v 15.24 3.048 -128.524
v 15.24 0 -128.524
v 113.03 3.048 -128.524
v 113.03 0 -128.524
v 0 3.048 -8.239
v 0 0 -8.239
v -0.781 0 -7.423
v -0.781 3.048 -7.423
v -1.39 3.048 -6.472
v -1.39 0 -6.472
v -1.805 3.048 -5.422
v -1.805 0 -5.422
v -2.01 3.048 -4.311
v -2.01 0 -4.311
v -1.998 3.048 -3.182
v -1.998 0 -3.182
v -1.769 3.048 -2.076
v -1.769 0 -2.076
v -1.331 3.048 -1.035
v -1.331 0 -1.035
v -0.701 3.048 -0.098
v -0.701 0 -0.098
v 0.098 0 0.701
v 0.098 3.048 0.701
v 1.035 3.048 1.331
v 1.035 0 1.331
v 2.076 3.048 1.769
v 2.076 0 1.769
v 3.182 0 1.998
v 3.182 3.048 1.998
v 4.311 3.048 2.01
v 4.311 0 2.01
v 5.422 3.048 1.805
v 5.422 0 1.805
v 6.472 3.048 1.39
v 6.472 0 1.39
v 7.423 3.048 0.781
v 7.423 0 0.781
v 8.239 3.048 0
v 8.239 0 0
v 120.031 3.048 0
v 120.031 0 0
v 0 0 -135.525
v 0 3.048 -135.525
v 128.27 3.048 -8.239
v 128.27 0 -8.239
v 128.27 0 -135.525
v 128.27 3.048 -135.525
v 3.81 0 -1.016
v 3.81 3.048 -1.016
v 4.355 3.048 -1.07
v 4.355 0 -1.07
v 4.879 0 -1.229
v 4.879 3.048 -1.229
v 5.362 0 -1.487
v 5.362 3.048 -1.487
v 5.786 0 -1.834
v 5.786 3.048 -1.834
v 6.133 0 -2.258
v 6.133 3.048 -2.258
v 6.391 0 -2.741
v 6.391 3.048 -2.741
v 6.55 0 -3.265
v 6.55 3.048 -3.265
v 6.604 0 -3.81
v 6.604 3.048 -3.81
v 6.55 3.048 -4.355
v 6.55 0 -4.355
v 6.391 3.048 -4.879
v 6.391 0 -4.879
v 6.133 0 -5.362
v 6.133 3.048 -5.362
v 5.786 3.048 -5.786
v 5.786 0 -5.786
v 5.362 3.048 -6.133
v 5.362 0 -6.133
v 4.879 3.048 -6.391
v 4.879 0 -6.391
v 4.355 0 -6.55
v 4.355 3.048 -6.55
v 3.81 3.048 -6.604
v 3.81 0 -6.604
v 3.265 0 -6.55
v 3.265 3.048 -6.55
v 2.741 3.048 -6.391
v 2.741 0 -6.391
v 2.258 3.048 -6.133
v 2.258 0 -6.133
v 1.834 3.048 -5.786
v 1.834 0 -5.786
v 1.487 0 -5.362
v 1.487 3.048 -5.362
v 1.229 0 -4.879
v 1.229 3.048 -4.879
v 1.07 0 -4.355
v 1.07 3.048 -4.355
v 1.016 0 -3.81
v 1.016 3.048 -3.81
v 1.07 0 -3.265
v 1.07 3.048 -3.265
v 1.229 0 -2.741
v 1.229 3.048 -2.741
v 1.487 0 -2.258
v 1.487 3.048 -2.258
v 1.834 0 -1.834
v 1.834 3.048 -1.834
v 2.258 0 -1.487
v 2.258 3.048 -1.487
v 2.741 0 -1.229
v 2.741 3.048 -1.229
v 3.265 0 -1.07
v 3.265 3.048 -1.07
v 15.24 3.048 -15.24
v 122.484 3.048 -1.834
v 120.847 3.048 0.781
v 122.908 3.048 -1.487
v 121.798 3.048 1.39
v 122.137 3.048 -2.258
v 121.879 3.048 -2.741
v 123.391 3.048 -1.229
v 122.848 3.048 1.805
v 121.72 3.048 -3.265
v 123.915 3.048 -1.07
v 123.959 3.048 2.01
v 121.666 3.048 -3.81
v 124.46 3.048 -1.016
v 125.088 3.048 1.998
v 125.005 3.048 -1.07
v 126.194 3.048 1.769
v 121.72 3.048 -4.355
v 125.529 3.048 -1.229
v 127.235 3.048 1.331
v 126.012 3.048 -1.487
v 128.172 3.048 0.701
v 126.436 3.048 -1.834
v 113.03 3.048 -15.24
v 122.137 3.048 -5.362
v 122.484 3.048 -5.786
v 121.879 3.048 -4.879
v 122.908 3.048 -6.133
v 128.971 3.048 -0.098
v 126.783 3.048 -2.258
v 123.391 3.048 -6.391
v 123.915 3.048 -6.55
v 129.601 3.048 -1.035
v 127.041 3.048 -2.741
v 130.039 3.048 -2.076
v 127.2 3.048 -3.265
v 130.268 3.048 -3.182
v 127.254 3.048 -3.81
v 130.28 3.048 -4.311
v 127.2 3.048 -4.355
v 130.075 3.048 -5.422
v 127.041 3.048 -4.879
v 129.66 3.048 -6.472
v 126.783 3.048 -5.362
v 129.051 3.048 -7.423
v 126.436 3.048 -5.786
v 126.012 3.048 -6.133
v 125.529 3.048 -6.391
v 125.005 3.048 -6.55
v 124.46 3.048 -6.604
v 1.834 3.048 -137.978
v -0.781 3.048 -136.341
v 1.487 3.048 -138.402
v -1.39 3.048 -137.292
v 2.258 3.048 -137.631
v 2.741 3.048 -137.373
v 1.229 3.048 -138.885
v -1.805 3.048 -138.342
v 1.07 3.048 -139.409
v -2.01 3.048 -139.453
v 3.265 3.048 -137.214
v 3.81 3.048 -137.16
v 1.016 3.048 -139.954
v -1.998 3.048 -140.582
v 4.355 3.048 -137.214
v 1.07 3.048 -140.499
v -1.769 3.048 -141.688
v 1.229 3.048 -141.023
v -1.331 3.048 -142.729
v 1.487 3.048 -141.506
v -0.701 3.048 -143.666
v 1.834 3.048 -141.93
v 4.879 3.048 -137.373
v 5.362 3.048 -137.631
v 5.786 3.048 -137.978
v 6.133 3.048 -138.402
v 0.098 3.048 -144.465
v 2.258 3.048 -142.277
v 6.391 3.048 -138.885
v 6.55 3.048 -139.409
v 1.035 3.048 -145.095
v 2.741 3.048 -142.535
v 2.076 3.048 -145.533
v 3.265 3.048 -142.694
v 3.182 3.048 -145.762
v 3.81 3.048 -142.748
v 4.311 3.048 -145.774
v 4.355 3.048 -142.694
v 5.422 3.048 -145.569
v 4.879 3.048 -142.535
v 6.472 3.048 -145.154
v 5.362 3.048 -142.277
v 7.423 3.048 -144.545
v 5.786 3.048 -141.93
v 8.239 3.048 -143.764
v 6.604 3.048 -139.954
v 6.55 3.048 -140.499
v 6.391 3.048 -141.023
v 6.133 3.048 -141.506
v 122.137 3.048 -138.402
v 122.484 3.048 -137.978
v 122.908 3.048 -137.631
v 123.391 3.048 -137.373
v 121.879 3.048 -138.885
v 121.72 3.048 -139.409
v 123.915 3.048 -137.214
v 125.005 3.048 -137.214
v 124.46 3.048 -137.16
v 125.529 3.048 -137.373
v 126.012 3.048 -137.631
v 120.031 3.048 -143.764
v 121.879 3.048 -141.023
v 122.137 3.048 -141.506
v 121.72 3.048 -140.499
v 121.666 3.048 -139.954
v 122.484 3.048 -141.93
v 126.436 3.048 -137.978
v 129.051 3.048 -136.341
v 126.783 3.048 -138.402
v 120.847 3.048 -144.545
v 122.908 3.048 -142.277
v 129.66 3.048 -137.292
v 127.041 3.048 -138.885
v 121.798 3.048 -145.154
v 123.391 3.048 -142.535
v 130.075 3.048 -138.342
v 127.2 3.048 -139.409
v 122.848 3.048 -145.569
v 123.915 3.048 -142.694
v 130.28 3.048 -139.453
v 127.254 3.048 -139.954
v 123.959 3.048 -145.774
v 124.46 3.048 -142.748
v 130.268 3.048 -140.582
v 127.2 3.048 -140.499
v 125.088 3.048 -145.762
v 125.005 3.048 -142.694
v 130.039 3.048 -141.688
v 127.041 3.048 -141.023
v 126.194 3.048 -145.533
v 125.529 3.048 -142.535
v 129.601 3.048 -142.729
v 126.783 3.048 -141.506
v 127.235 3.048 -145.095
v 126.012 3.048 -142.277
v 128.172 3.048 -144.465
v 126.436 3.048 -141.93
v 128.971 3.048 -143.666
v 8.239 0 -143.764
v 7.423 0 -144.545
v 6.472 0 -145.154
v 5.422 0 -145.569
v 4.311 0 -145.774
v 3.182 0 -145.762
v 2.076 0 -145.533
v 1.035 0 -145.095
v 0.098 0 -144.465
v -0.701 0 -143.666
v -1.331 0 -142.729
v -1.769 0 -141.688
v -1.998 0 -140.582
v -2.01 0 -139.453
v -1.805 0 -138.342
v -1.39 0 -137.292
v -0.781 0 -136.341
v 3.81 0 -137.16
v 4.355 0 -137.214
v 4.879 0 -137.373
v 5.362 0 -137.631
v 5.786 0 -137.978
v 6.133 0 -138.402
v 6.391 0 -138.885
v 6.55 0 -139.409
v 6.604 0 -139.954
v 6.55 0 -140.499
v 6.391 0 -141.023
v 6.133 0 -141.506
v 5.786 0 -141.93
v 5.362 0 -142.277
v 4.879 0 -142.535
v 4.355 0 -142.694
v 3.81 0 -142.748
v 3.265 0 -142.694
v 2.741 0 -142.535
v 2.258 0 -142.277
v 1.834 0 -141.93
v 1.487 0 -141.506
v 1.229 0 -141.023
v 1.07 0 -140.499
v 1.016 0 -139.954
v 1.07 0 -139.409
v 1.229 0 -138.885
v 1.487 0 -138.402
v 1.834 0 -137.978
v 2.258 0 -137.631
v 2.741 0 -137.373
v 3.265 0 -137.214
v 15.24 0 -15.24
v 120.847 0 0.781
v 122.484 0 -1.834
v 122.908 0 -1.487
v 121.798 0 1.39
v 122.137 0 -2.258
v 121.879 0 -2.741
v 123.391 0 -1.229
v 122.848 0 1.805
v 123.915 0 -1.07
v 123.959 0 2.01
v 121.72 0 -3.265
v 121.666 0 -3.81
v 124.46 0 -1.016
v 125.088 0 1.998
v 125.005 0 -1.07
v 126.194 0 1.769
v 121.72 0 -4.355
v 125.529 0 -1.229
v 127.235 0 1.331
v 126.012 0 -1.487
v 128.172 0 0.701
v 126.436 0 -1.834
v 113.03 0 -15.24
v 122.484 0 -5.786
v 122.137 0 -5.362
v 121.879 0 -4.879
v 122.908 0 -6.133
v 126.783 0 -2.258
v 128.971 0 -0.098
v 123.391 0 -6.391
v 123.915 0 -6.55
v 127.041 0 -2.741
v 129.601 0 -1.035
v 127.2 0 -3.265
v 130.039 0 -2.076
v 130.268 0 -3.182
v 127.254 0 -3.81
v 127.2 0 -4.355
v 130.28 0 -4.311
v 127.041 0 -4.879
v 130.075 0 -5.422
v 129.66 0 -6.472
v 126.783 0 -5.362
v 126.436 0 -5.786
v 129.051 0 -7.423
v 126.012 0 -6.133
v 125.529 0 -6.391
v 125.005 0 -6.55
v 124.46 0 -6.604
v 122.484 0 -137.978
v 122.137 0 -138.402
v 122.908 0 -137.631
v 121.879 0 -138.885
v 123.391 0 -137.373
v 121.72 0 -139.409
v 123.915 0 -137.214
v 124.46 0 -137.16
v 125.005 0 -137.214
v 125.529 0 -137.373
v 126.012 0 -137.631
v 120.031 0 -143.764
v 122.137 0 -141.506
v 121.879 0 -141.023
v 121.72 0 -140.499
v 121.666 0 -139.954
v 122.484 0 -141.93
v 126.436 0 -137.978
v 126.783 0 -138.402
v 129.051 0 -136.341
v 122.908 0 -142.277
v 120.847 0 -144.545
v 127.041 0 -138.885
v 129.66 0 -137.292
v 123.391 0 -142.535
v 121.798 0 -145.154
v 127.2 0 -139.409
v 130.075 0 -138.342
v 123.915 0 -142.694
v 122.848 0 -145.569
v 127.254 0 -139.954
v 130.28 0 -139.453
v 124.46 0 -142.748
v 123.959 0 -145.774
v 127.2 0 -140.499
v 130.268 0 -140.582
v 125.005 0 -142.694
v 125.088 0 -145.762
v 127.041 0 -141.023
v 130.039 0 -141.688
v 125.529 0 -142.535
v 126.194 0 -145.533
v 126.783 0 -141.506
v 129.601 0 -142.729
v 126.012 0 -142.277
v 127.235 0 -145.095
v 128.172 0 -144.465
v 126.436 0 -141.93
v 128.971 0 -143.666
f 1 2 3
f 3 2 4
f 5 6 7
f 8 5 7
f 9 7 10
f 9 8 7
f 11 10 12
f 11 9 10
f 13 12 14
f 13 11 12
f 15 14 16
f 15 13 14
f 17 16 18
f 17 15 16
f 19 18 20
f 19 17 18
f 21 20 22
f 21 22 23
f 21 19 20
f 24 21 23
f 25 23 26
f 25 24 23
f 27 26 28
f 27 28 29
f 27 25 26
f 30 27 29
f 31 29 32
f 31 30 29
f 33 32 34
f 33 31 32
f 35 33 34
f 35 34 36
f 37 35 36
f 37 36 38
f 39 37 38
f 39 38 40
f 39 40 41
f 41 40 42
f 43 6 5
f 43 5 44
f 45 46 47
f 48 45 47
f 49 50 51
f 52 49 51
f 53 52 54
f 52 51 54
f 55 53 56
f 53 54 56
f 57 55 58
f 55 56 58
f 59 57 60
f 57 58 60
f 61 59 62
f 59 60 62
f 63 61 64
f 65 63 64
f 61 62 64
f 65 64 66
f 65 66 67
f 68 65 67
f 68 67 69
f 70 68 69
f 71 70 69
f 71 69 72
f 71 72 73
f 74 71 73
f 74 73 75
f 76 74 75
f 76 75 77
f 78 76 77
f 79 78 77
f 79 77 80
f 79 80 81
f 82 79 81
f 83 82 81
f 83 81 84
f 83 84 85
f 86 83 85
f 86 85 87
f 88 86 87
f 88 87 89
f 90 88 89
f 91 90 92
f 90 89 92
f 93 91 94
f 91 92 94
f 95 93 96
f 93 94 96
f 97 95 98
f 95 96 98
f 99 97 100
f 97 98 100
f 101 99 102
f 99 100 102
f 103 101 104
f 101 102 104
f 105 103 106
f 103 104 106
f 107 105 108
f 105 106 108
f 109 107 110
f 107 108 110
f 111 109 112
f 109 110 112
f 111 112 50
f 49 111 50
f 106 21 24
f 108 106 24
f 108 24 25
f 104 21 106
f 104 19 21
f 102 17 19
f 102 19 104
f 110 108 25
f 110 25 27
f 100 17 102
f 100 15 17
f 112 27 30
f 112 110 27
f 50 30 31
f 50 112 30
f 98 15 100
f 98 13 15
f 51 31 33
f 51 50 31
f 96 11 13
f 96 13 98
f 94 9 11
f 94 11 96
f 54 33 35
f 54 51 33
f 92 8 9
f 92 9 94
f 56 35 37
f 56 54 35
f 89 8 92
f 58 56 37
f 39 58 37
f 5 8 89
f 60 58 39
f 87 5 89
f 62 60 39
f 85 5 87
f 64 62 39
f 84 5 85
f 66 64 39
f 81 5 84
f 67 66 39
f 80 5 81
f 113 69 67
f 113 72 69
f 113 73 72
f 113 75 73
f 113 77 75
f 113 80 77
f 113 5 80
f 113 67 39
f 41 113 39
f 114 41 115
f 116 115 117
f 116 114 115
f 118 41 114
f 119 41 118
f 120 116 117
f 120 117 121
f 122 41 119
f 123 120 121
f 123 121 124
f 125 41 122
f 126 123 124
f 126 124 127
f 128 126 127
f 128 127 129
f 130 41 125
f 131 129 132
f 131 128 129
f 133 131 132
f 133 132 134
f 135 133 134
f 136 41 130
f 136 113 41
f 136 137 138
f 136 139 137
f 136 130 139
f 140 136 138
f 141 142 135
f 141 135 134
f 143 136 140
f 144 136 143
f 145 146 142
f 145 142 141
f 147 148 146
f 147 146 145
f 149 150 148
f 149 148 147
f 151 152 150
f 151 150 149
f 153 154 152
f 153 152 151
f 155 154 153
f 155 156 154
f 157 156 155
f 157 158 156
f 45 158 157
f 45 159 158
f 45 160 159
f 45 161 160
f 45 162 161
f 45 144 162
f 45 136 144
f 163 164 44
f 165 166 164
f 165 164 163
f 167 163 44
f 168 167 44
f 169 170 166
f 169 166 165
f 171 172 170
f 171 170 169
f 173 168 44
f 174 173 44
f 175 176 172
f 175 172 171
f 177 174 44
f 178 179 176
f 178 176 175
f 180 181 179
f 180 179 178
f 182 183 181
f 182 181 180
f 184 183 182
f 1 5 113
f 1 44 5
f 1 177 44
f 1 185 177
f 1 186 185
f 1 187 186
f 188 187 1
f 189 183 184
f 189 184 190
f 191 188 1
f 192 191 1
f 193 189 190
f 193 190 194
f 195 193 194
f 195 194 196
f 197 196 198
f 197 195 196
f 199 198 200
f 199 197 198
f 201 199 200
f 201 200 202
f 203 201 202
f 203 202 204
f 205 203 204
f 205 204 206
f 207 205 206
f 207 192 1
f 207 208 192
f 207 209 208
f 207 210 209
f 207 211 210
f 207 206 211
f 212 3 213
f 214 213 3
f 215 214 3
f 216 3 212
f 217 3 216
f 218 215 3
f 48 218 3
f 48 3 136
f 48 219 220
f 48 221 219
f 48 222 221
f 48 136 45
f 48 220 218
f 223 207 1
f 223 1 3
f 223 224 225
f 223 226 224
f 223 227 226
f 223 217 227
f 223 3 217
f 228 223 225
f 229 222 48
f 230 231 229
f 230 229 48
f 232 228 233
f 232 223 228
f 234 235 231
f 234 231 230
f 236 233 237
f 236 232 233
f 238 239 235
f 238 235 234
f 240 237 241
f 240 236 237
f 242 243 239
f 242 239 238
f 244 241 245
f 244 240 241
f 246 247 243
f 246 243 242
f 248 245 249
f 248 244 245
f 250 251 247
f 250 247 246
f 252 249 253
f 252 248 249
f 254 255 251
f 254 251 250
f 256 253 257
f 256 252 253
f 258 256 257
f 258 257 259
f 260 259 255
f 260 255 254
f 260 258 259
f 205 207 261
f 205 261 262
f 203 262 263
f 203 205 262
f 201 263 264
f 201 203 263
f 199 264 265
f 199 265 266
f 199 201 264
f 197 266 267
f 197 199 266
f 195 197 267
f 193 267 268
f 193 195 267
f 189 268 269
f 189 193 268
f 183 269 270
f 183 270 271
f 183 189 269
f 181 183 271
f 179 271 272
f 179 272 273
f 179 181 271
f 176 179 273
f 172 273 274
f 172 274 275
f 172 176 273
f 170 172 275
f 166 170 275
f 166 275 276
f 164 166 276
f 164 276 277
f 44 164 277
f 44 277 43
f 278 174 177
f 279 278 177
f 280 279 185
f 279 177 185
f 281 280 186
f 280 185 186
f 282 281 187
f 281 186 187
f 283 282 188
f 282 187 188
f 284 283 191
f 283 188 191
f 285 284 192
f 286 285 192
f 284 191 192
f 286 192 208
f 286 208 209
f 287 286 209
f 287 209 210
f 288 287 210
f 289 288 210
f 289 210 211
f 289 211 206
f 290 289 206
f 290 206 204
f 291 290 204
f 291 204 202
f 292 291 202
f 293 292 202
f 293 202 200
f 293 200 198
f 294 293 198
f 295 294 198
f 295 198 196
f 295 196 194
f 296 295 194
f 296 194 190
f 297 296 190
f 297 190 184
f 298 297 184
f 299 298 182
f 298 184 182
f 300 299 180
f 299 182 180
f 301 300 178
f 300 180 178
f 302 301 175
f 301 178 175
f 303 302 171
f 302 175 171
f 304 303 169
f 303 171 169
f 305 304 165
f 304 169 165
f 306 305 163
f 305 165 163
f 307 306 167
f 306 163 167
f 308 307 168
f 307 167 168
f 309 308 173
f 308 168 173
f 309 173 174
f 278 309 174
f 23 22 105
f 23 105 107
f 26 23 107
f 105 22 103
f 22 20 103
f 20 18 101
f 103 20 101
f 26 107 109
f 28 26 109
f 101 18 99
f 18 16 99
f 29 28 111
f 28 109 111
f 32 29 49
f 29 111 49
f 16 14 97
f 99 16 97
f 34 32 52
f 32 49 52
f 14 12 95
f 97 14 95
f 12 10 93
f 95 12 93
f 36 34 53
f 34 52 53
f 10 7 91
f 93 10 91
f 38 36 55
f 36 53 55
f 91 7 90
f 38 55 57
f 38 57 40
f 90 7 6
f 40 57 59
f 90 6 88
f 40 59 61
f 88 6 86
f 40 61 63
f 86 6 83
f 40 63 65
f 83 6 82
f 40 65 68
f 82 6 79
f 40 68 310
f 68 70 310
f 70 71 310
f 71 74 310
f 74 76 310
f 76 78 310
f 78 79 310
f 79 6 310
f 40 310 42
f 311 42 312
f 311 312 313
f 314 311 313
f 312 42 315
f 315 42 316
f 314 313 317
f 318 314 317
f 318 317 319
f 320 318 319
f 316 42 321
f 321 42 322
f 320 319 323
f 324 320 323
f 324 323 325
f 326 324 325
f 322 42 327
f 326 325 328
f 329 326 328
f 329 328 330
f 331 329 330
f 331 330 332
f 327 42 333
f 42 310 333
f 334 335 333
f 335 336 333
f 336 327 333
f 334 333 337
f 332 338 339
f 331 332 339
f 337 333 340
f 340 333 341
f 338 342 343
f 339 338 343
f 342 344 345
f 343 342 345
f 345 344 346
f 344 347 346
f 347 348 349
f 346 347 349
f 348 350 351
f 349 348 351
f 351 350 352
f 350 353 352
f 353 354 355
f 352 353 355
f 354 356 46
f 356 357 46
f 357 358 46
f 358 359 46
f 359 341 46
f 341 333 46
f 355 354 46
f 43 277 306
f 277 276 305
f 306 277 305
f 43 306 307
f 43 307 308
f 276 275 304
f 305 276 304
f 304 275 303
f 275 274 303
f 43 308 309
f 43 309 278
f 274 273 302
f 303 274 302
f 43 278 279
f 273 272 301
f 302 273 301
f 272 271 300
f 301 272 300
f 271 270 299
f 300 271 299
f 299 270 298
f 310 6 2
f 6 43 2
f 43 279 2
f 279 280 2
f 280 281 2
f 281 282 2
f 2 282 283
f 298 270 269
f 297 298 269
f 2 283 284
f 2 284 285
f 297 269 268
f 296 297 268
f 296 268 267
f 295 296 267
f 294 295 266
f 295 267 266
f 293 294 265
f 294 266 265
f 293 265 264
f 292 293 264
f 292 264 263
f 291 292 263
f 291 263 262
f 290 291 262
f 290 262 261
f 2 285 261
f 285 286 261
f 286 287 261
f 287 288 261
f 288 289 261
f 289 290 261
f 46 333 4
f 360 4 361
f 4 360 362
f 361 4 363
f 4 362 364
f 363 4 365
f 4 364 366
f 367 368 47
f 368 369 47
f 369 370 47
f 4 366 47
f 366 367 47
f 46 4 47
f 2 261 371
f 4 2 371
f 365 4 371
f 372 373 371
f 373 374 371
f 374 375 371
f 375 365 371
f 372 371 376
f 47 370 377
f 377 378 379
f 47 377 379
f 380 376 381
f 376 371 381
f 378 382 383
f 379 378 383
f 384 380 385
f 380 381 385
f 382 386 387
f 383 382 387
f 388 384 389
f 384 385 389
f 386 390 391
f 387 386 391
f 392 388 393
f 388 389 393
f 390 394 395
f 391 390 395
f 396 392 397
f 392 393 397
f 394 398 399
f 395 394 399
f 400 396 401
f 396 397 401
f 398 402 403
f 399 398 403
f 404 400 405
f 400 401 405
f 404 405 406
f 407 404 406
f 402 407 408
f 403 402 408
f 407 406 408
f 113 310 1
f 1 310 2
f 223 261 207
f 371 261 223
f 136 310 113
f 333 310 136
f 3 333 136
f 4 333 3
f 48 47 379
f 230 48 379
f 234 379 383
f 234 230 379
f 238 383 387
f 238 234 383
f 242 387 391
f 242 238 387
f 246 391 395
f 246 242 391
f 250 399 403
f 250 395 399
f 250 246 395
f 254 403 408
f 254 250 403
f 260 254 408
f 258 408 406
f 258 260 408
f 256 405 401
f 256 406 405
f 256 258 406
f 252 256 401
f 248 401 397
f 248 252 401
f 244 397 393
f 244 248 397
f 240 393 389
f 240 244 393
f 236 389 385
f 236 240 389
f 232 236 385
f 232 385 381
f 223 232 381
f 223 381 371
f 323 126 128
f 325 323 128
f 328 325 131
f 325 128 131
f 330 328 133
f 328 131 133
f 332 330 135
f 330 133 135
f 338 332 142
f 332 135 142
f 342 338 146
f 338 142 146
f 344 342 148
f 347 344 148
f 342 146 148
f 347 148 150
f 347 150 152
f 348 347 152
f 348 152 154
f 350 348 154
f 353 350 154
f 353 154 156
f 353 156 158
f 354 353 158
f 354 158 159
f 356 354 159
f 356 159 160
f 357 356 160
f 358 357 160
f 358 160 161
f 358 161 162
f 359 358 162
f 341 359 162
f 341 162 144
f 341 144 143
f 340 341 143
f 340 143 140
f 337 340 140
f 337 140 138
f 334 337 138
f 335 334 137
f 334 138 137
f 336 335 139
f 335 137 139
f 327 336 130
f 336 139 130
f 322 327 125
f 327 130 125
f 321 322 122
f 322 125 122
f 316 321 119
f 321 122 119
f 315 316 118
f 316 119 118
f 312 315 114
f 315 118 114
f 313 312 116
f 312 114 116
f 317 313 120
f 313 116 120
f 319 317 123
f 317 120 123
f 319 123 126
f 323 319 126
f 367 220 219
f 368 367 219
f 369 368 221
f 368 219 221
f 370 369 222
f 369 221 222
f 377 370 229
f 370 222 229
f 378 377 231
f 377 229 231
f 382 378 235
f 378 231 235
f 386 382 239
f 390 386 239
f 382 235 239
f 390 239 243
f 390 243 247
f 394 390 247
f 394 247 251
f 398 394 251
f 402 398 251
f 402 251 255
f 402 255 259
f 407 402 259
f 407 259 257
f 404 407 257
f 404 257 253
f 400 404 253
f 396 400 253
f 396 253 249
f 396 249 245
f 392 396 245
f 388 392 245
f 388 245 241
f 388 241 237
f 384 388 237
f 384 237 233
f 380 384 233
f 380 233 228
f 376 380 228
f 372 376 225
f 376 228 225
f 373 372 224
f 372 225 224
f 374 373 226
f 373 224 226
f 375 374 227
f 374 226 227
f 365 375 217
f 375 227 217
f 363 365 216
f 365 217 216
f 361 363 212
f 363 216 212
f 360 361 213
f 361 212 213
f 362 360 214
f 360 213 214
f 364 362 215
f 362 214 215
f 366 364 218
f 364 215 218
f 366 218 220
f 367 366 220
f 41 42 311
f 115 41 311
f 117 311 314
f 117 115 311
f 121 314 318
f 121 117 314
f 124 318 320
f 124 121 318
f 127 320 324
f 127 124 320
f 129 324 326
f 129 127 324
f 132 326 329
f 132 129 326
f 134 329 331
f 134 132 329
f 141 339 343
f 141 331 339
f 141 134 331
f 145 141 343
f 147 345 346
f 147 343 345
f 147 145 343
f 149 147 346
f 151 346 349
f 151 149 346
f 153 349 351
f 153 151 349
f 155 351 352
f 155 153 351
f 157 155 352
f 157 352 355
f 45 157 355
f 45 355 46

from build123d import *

# Parameters (mm, degrees)
SKETCH1_W           = 128.27
SKETCH1_H           = 143.764
SKETCH1_W_2         = 97.79
SKETCH1_H_2         = 113.284
BOSS_EXTRUDE1_DEPTH = 3.048
SKETCH2_R           = 2.794
CUT_EXTRUDE1_DEPTH  = 3.302
SKETCH4_R           = 5.842
SKETCH4_R_2         = 2.794
BOSS_EXTRUDE2_DEPTH = 3.048


with BuildPart() as part:
    # Sketch1 → Boss-Extrude1 (new body)
    with BuildSketch(Plane(origin=(0, 0, 0), x_dir=(1, 0, 0), z_dir=(0, 1, 0))):
        with Locations((64.135, 71.882)):
            Rectangle(SKETCH1_W, SKETCH1_H)
        with Locations((64.135, 71.882)):
            Rectangle(SKETCH1_W_2, SKETCH1_H_2, mode=Mode.SUBTRACT)
    extrude(amount=BOSS_EXTRUDE1_DEPTH)

    # Sketch2 → Cut-Extrude1 (cut)
    with BuildSketch(Plane(origin=(0, 3.048, 0), x_dir=(1, 0, 0), z_dir=(0, 1, 0))):
        with Locations(Location((3.81, 139.954, 0), (0, 0, 270))):
            Circle(SKETCH2_R)
        with Locations(Location((124.46, 139.954, 0), (0, 0, 270))):
            Circle(SKETCH2_R)
        with Locations(Location((124.46, 3.81, 0), (0, 0, 270))):
            Circle(SKETCH2_R)
        with Locations(Location((3.81, 3.81, 0), (0, 0, 270))):
            Circle(SKETCH2_R)
    extrude(amount=-CUT_EXTRUDE1_DEPTH, mode=Mode.SUBTRACT)

    # Sketch4 → Boss-Extrude2 (add, through all)
    # profile 1 of 4: a face of its own
    with BuildSketch(Plane(origin=(0, 3.048, 0), x_dir=(1, 0, 0), z_dir=(0, 1, 0))):
        with Locations((3.81, 139.954)):
            Circle(SKETCH4_R)
        with Locations(Location((3.81, 139.954, 0), (0, 0, 270))):
            Circle(SKETCH4_R_2, mode=Mode.SUBTRACT)
    # profile 2 of 4: a face of its own
    with BuildSketch(Plane(origin=(0, 3.048, 0), x_dir=(1, 0, 0), z_dir=(0, 1, 0))):
        with Locations((124.46, 139.954)):
            Circle(SKETCH4_R)
        with Locations(Location((124.46, 139.954, 0), (0, 0, 270))):
            Circle(SKETCH4_R_2, mode=Mode.SUBTRACT)
    # profile 3 of 4: a face of its own
    with BuildSketch(Plane(origin=(0, 3.048, 0), x_dir=(1, 0, 0), z_dir=(0, 1, 0))):
        with Locations((124.46, 3.81)):
            Circle(SKETCH4_R)
        with Locations(Location((124.46, 3.81, 0), (0, 0, 270))):
            Circle(SKETCH4_R_2, mode=Mode.SUBTRACT)
    # profile 4 of 4: a face of its own
    with BuildSketch(Plane(origin=(0, 3.048, 0), x_dir=(1, 0, 0), z_dir=(0, 1, 0))):
        with Locations((3.81, 3.81)):
            Circle(SKETCH4_R)
        with Locations(Location((3.81, 3.81, 0), (0, 0, 270))):
            Circle(SKETCH4_R_2, mode=Mode.SUBTRACT)
    extrude(amount=-BOSS_EXTRUDE2_DEPTH)


solid = part.part
